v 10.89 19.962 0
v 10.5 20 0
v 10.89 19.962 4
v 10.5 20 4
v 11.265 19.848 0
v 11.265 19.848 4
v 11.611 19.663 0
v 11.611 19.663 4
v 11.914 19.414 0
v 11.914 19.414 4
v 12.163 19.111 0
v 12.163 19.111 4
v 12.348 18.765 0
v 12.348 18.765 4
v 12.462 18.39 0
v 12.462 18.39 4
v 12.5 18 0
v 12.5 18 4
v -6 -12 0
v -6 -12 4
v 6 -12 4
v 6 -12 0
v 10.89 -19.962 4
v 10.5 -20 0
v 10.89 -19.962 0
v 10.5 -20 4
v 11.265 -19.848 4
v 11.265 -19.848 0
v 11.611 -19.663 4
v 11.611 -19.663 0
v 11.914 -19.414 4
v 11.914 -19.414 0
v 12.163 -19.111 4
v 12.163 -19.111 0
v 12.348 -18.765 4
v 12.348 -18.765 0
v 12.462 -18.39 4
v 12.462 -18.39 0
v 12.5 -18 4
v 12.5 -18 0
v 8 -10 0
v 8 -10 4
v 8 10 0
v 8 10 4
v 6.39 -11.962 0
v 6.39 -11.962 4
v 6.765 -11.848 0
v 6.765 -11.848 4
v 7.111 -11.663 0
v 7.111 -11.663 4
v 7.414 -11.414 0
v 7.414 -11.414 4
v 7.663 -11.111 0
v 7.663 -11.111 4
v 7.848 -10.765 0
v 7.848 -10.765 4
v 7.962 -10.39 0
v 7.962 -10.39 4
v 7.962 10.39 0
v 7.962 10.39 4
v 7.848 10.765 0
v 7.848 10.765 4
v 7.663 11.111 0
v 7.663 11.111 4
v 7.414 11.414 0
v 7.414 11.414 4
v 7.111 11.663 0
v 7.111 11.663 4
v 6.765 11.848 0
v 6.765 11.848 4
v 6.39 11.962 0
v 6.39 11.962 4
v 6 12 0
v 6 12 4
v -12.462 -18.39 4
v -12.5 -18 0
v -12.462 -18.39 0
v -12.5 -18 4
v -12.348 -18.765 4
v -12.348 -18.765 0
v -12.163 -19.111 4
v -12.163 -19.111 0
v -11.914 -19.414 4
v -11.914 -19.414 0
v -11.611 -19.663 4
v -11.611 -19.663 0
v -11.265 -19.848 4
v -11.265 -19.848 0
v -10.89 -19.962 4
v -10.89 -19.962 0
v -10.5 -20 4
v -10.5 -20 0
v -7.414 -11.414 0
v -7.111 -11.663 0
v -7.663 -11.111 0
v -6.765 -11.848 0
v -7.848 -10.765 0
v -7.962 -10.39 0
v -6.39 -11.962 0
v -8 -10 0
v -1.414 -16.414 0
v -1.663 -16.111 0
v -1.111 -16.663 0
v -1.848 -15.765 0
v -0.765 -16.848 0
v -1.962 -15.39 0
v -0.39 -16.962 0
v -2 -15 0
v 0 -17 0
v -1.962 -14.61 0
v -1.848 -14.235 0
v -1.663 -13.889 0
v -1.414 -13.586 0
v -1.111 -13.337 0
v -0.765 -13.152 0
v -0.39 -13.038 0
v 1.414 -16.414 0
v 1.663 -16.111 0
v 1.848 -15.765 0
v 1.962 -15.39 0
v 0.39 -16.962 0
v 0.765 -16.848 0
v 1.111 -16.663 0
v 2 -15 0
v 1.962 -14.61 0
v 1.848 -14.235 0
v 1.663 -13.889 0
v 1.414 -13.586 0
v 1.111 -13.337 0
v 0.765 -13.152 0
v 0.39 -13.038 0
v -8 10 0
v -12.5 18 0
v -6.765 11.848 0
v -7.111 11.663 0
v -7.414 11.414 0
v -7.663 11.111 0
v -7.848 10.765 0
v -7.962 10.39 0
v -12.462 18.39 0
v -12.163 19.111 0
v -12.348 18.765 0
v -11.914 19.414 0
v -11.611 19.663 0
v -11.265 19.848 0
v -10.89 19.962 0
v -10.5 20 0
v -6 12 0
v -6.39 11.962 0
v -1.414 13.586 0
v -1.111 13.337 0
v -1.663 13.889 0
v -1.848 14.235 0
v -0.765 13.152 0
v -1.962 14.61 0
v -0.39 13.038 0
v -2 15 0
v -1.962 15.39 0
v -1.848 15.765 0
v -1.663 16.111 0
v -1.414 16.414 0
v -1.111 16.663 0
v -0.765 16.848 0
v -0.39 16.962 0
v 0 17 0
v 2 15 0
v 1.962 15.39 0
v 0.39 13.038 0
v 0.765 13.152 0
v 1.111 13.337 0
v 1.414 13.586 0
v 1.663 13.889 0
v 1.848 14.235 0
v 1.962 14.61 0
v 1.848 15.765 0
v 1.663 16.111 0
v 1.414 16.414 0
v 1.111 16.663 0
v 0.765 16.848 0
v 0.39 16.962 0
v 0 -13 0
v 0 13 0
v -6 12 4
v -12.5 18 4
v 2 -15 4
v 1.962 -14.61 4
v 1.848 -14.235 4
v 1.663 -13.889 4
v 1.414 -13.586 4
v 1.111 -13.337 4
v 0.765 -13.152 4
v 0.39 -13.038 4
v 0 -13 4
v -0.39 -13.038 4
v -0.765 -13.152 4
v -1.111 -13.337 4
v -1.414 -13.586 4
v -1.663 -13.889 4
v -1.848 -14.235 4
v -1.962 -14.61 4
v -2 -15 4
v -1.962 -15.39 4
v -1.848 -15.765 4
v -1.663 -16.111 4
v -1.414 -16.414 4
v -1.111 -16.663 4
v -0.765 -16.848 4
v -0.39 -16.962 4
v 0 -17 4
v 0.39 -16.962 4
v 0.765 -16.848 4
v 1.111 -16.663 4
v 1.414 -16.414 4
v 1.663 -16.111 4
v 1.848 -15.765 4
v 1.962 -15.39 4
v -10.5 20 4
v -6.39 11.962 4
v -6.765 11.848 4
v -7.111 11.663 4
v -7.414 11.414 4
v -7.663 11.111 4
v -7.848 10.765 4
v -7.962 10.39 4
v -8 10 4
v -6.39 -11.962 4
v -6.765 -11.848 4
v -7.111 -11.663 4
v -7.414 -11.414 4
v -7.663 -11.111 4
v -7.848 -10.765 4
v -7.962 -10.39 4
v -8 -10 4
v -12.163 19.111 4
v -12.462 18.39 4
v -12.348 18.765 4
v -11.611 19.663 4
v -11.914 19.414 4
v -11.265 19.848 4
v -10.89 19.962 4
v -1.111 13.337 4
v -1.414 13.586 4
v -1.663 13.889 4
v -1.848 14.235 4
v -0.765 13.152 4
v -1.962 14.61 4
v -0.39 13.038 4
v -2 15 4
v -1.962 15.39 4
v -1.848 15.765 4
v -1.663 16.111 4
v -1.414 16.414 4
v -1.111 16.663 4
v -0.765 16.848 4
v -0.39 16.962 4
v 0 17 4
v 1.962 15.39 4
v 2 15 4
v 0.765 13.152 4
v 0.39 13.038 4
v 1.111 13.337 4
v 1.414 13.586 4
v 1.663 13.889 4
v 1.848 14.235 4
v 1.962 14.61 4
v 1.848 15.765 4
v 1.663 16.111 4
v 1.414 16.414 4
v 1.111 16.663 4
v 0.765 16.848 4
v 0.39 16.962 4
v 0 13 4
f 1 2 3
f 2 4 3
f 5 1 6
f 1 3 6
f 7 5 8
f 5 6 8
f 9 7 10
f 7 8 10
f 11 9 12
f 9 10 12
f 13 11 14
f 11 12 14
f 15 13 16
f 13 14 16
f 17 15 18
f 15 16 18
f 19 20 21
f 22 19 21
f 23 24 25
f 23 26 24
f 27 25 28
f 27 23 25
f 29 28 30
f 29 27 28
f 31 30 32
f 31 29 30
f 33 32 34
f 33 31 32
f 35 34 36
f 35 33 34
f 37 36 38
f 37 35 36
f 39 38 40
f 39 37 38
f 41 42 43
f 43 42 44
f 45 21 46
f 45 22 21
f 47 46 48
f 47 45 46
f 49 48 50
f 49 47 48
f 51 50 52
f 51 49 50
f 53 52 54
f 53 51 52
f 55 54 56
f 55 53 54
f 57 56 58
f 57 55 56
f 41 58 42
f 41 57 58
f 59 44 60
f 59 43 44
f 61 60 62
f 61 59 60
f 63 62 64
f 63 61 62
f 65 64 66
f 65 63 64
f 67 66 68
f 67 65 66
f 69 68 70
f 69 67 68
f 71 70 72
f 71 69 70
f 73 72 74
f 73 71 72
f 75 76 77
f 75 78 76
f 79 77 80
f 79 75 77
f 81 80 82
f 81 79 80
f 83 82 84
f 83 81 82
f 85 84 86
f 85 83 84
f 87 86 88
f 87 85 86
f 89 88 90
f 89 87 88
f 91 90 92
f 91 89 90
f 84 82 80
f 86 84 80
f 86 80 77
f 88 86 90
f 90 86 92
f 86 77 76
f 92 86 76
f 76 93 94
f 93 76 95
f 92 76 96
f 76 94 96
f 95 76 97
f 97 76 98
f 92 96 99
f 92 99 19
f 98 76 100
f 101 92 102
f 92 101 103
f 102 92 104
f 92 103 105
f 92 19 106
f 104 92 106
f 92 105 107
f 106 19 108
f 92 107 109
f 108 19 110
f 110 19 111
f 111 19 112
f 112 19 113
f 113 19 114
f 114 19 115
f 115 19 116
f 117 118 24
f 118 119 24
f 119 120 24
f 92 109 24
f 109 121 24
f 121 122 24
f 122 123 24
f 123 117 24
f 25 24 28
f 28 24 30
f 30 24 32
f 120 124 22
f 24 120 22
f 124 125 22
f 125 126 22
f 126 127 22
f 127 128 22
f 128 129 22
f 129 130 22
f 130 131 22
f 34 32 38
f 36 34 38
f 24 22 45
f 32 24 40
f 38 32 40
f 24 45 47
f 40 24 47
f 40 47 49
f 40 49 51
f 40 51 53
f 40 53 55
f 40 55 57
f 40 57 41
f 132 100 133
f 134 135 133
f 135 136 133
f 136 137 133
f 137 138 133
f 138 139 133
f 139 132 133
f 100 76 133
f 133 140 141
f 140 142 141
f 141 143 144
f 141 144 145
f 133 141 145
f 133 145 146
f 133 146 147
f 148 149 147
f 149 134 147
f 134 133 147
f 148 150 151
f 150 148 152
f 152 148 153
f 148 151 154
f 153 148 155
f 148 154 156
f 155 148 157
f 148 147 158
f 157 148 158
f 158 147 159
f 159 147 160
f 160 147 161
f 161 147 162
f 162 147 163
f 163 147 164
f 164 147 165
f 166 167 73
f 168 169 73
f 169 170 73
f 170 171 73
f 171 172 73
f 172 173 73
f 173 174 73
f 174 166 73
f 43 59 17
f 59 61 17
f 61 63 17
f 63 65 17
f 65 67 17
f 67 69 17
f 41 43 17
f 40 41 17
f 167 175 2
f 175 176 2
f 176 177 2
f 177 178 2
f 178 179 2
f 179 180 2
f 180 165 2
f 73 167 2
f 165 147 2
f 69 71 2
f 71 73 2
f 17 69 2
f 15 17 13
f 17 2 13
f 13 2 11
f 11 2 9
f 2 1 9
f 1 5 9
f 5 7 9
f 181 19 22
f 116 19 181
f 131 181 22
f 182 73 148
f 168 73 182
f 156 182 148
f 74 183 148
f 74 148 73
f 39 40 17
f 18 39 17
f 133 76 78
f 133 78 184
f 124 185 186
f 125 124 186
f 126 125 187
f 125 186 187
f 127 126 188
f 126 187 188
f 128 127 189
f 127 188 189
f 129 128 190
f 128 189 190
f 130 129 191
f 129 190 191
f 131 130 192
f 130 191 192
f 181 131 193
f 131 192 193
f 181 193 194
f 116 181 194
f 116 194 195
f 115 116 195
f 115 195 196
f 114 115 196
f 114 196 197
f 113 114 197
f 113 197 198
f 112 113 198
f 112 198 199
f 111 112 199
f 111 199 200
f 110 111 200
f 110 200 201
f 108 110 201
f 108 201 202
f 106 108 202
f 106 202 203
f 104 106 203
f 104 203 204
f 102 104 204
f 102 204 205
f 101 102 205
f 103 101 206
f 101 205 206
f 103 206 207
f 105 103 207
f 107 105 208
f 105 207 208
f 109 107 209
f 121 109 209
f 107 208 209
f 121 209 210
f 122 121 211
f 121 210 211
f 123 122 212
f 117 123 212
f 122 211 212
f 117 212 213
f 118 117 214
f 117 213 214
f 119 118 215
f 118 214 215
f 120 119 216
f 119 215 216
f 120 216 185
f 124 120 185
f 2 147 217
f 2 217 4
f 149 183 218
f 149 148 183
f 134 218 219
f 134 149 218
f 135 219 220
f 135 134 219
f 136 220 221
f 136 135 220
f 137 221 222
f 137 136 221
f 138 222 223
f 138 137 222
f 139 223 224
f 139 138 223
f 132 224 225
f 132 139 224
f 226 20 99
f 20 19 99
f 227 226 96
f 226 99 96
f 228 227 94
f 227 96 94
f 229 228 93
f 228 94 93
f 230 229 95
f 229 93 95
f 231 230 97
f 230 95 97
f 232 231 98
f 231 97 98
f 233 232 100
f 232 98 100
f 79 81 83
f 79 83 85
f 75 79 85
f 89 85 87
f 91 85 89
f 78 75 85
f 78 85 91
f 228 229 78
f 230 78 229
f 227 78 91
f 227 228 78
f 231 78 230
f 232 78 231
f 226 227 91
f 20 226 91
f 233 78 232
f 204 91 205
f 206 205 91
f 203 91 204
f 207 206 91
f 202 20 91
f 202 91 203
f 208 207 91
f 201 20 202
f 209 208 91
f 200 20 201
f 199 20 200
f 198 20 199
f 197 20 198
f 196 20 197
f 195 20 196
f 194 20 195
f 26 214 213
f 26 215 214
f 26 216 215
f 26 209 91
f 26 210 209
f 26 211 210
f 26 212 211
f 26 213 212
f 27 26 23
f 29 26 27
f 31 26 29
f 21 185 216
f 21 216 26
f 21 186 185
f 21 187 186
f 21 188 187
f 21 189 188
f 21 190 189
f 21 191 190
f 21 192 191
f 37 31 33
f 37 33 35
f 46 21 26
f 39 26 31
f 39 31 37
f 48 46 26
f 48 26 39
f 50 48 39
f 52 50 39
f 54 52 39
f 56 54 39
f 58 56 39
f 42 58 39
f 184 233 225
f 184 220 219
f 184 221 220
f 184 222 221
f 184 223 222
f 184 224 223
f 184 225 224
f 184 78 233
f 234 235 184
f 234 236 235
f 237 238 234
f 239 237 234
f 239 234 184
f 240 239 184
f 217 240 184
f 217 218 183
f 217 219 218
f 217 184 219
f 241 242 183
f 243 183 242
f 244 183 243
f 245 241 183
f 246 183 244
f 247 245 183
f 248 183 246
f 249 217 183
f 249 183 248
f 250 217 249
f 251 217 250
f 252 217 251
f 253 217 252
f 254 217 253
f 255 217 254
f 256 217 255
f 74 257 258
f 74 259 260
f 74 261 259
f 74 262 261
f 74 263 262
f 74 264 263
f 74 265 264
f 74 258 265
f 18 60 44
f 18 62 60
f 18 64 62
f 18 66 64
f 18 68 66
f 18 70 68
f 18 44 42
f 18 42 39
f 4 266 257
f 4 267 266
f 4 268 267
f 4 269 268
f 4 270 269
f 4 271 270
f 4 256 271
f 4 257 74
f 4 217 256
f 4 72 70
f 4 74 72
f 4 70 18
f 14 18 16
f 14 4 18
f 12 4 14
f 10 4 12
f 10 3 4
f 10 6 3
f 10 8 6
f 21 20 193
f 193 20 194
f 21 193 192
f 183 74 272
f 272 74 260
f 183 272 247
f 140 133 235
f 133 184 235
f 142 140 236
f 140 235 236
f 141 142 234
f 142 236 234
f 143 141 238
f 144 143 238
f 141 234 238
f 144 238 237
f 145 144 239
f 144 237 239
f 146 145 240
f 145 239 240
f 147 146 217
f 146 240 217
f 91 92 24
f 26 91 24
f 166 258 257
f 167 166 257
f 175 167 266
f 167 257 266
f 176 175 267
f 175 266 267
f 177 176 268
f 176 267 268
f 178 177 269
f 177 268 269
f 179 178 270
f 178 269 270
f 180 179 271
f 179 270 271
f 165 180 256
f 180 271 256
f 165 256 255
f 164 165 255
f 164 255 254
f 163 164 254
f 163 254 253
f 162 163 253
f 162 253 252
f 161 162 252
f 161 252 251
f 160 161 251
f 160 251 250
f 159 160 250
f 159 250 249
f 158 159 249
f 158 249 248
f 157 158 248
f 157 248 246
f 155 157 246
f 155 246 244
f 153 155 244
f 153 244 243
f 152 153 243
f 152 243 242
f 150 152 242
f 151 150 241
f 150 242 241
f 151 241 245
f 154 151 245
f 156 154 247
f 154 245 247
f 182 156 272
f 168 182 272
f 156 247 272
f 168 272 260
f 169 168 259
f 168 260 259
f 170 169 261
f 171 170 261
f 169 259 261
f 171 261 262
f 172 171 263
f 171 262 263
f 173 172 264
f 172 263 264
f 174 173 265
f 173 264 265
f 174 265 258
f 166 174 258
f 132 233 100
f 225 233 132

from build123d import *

# Parameters (mm, degrees)
SKETCH_1_W          = 25
SKETCH_1_H          = 40
EXTRUDE_1_DEPTH     = 4
SKETCH_2_R          = 2
CUT_EXTRUDE_1_DEPTH = 10
FILLET_1_R          = 2
SKETCH_3_W          = 16
SKETCH_3_H          = 24
CUT_EXTRUDE_2_DEPTH = 10
FILLET_2_R          = 2


with BuildPart() as part:
    # 草图1 → 凸台-拉伸1 (new body)
    with BuildSketch(Plane.XY):
        Rectangle(SKETCH_1_W, SKETCH_1_H)
    extrude(amount=EXTRUDE_1_DEPTH)

    # 草图2 → 切除-拉伸1 (cut)
    with BuildSketch(Plane.XY.offset(4)):
        with Locations((0, 15)):
            Circle(SKETCH_2_R)
        with Locations((0, -15)):
            Circle(SKETCH_2_R)
    extrude(amount=-CUT_EXTRUDE_1_DEPTH, mode=Mode.SUBTRACT)

    # 圆角1
    fillet_1_edges = [part.edges().sort_by_distance(p)[0] for p in [
        (12.5, -20, 2),
        (-12.5, -20, 2),
        (-12.5, 20, 2),
        (12.5, 20, 2),
    ]]
    fillet(fillet_1_edges, radius=FILLET_1_R)

    # 草图3 → 切除-拉伸2 (cut)
    with BuildSketch(Plane.XY.offset(4)):
        Rectangle(SKETCH_3_W, SKETCH_3_H)
    extrude(amount=-CUT_EXTRUDE_2_DEPTH, mode=Mode.SUBTRACT)

    # 圆角2
    fillet_2_edges = [part.edges().sort_by_distance(p)[0] for p in [
        (8, 12, 2),
        (8, -12, 2),
        (-8, -12, 2),
        (-8, 12, 2),
    ]]
    fillet(fillet_2_edges, radius=FILLET_2_R)


solid = part.part
